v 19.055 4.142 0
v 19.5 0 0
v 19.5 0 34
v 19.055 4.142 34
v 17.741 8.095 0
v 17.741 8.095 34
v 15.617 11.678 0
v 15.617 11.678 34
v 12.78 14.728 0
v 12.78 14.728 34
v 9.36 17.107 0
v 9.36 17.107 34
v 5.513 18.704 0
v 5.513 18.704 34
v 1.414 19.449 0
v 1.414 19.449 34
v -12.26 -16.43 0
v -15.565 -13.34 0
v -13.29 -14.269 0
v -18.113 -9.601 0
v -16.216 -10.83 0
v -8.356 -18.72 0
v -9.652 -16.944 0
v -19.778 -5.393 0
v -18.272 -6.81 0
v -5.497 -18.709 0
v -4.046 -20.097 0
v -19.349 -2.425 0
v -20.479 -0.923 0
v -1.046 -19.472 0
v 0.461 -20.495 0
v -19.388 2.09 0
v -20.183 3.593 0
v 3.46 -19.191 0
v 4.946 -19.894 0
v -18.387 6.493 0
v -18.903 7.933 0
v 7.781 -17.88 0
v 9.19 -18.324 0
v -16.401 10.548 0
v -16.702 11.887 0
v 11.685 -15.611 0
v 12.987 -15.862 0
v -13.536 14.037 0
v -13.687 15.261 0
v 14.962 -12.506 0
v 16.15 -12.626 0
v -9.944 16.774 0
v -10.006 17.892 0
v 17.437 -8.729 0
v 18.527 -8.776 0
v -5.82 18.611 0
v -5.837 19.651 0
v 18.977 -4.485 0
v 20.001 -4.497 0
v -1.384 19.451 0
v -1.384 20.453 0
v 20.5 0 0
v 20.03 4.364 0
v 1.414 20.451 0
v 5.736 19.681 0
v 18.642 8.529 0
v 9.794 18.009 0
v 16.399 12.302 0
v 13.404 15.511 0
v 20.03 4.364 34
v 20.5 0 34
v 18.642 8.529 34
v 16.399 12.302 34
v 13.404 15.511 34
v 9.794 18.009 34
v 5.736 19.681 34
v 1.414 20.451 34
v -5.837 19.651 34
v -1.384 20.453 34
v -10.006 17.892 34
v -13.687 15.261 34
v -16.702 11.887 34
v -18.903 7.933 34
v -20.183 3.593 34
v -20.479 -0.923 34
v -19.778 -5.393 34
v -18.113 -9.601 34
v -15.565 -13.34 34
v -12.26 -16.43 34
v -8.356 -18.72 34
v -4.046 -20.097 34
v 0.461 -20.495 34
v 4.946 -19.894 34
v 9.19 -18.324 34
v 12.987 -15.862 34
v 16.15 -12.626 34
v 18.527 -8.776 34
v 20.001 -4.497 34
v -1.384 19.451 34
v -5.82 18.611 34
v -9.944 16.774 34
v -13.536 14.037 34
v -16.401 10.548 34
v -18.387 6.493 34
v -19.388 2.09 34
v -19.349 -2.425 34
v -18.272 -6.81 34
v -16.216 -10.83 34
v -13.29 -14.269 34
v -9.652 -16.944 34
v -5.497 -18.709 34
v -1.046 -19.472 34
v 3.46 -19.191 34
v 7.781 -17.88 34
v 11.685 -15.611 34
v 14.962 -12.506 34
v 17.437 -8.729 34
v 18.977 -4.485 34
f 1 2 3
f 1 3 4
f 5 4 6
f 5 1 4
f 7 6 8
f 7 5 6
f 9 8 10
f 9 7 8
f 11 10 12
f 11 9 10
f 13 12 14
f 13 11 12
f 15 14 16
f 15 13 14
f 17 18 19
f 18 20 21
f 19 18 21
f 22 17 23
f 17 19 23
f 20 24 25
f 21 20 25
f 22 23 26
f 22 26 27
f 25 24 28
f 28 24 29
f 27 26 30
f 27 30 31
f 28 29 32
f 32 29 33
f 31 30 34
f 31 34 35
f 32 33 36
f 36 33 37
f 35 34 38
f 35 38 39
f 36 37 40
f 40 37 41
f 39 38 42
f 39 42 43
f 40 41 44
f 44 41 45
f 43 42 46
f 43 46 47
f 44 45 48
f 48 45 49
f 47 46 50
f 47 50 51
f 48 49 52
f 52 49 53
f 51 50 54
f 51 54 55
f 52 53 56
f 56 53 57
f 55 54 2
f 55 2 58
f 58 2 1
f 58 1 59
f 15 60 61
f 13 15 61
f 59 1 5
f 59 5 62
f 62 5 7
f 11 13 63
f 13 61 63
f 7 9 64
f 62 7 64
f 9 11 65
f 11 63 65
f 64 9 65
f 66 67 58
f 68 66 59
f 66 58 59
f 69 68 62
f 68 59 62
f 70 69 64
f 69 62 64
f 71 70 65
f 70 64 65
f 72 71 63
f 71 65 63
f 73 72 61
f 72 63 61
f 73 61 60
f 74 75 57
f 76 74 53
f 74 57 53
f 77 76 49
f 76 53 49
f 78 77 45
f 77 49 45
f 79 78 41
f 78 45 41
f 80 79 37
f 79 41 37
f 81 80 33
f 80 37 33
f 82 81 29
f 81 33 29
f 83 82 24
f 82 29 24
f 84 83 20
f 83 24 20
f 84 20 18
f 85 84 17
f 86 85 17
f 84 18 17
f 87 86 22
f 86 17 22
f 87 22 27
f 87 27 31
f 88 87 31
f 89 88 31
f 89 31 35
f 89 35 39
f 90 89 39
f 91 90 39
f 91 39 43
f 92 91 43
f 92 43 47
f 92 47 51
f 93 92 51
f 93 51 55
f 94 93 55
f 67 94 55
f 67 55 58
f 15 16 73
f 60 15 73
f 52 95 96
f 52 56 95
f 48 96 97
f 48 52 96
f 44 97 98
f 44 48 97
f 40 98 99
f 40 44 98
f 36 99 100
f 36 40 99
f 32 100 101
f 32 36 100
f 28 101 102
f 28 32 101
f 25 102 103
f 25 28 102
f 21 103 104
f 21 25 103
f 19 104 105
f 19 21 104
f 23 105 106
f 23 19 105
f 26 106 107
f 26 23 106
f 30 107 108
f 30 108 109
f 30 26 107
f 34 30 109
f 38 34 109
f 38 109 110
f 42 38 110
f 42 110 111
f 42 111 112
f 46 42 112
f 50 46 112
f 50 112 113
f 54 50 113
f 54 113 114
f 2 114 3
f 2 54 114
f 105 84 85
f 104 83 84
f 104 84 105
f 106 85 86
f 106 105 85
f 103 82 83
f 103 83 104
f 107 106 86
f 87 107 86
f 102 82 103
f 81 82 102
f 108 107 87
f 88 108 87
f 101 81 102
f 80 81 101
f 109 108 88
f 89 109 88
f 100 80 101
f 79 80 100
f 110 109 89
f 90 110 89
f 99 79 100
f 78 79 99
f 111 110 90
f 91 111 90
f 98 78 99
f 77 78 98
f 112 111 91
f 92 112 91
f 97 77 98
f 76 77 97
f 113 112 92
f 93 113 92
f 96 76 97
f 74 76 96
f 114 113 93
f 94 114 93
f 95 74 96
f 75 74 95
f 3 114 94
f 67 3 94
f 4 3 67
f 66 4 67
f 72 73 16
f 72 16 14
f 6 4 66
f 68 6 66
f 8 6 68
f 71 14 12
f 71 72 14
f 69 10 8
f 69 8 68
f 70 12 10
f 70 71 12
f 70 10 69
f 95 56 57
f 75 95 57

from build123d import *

# Parameters (mm, degrees)
SKETCH1_R           = 20.5
SKETCH1_R_2         = 19.5
BOSS_EXTRUDE1_DEPTH = 34
SKETCH2_W           = 2.79800491
SKETCH2_H           = 1.698963444
CUT_EXTRUDE1_DEPTH  = 35


with BuildPart() as part:
    # Sketch1 → Boss-Extrude1 (new body)
    with BuildSketch(Plane.XY):
        Circle(SKETCH1_R)
        Circle(SKETCH1_R_2, mode=Mode.SUBTRACT)
    extrude(amount=BOSS_EXTRUDE1_DEPTH)

    # Sketch2 → Cut-Extrude1 (cut, through all)
    with BuildSketch(Plane.XY.offset(34)):
        with Locations((0.015441627, 20.064895184)):
            Rectangle(SKETCH2_W, SKETCH2_H)
    extrude(amount=-CUT_EXTRUDE1_DEPTH, mode=Mode.SUBTRACT)


solid = part.part
